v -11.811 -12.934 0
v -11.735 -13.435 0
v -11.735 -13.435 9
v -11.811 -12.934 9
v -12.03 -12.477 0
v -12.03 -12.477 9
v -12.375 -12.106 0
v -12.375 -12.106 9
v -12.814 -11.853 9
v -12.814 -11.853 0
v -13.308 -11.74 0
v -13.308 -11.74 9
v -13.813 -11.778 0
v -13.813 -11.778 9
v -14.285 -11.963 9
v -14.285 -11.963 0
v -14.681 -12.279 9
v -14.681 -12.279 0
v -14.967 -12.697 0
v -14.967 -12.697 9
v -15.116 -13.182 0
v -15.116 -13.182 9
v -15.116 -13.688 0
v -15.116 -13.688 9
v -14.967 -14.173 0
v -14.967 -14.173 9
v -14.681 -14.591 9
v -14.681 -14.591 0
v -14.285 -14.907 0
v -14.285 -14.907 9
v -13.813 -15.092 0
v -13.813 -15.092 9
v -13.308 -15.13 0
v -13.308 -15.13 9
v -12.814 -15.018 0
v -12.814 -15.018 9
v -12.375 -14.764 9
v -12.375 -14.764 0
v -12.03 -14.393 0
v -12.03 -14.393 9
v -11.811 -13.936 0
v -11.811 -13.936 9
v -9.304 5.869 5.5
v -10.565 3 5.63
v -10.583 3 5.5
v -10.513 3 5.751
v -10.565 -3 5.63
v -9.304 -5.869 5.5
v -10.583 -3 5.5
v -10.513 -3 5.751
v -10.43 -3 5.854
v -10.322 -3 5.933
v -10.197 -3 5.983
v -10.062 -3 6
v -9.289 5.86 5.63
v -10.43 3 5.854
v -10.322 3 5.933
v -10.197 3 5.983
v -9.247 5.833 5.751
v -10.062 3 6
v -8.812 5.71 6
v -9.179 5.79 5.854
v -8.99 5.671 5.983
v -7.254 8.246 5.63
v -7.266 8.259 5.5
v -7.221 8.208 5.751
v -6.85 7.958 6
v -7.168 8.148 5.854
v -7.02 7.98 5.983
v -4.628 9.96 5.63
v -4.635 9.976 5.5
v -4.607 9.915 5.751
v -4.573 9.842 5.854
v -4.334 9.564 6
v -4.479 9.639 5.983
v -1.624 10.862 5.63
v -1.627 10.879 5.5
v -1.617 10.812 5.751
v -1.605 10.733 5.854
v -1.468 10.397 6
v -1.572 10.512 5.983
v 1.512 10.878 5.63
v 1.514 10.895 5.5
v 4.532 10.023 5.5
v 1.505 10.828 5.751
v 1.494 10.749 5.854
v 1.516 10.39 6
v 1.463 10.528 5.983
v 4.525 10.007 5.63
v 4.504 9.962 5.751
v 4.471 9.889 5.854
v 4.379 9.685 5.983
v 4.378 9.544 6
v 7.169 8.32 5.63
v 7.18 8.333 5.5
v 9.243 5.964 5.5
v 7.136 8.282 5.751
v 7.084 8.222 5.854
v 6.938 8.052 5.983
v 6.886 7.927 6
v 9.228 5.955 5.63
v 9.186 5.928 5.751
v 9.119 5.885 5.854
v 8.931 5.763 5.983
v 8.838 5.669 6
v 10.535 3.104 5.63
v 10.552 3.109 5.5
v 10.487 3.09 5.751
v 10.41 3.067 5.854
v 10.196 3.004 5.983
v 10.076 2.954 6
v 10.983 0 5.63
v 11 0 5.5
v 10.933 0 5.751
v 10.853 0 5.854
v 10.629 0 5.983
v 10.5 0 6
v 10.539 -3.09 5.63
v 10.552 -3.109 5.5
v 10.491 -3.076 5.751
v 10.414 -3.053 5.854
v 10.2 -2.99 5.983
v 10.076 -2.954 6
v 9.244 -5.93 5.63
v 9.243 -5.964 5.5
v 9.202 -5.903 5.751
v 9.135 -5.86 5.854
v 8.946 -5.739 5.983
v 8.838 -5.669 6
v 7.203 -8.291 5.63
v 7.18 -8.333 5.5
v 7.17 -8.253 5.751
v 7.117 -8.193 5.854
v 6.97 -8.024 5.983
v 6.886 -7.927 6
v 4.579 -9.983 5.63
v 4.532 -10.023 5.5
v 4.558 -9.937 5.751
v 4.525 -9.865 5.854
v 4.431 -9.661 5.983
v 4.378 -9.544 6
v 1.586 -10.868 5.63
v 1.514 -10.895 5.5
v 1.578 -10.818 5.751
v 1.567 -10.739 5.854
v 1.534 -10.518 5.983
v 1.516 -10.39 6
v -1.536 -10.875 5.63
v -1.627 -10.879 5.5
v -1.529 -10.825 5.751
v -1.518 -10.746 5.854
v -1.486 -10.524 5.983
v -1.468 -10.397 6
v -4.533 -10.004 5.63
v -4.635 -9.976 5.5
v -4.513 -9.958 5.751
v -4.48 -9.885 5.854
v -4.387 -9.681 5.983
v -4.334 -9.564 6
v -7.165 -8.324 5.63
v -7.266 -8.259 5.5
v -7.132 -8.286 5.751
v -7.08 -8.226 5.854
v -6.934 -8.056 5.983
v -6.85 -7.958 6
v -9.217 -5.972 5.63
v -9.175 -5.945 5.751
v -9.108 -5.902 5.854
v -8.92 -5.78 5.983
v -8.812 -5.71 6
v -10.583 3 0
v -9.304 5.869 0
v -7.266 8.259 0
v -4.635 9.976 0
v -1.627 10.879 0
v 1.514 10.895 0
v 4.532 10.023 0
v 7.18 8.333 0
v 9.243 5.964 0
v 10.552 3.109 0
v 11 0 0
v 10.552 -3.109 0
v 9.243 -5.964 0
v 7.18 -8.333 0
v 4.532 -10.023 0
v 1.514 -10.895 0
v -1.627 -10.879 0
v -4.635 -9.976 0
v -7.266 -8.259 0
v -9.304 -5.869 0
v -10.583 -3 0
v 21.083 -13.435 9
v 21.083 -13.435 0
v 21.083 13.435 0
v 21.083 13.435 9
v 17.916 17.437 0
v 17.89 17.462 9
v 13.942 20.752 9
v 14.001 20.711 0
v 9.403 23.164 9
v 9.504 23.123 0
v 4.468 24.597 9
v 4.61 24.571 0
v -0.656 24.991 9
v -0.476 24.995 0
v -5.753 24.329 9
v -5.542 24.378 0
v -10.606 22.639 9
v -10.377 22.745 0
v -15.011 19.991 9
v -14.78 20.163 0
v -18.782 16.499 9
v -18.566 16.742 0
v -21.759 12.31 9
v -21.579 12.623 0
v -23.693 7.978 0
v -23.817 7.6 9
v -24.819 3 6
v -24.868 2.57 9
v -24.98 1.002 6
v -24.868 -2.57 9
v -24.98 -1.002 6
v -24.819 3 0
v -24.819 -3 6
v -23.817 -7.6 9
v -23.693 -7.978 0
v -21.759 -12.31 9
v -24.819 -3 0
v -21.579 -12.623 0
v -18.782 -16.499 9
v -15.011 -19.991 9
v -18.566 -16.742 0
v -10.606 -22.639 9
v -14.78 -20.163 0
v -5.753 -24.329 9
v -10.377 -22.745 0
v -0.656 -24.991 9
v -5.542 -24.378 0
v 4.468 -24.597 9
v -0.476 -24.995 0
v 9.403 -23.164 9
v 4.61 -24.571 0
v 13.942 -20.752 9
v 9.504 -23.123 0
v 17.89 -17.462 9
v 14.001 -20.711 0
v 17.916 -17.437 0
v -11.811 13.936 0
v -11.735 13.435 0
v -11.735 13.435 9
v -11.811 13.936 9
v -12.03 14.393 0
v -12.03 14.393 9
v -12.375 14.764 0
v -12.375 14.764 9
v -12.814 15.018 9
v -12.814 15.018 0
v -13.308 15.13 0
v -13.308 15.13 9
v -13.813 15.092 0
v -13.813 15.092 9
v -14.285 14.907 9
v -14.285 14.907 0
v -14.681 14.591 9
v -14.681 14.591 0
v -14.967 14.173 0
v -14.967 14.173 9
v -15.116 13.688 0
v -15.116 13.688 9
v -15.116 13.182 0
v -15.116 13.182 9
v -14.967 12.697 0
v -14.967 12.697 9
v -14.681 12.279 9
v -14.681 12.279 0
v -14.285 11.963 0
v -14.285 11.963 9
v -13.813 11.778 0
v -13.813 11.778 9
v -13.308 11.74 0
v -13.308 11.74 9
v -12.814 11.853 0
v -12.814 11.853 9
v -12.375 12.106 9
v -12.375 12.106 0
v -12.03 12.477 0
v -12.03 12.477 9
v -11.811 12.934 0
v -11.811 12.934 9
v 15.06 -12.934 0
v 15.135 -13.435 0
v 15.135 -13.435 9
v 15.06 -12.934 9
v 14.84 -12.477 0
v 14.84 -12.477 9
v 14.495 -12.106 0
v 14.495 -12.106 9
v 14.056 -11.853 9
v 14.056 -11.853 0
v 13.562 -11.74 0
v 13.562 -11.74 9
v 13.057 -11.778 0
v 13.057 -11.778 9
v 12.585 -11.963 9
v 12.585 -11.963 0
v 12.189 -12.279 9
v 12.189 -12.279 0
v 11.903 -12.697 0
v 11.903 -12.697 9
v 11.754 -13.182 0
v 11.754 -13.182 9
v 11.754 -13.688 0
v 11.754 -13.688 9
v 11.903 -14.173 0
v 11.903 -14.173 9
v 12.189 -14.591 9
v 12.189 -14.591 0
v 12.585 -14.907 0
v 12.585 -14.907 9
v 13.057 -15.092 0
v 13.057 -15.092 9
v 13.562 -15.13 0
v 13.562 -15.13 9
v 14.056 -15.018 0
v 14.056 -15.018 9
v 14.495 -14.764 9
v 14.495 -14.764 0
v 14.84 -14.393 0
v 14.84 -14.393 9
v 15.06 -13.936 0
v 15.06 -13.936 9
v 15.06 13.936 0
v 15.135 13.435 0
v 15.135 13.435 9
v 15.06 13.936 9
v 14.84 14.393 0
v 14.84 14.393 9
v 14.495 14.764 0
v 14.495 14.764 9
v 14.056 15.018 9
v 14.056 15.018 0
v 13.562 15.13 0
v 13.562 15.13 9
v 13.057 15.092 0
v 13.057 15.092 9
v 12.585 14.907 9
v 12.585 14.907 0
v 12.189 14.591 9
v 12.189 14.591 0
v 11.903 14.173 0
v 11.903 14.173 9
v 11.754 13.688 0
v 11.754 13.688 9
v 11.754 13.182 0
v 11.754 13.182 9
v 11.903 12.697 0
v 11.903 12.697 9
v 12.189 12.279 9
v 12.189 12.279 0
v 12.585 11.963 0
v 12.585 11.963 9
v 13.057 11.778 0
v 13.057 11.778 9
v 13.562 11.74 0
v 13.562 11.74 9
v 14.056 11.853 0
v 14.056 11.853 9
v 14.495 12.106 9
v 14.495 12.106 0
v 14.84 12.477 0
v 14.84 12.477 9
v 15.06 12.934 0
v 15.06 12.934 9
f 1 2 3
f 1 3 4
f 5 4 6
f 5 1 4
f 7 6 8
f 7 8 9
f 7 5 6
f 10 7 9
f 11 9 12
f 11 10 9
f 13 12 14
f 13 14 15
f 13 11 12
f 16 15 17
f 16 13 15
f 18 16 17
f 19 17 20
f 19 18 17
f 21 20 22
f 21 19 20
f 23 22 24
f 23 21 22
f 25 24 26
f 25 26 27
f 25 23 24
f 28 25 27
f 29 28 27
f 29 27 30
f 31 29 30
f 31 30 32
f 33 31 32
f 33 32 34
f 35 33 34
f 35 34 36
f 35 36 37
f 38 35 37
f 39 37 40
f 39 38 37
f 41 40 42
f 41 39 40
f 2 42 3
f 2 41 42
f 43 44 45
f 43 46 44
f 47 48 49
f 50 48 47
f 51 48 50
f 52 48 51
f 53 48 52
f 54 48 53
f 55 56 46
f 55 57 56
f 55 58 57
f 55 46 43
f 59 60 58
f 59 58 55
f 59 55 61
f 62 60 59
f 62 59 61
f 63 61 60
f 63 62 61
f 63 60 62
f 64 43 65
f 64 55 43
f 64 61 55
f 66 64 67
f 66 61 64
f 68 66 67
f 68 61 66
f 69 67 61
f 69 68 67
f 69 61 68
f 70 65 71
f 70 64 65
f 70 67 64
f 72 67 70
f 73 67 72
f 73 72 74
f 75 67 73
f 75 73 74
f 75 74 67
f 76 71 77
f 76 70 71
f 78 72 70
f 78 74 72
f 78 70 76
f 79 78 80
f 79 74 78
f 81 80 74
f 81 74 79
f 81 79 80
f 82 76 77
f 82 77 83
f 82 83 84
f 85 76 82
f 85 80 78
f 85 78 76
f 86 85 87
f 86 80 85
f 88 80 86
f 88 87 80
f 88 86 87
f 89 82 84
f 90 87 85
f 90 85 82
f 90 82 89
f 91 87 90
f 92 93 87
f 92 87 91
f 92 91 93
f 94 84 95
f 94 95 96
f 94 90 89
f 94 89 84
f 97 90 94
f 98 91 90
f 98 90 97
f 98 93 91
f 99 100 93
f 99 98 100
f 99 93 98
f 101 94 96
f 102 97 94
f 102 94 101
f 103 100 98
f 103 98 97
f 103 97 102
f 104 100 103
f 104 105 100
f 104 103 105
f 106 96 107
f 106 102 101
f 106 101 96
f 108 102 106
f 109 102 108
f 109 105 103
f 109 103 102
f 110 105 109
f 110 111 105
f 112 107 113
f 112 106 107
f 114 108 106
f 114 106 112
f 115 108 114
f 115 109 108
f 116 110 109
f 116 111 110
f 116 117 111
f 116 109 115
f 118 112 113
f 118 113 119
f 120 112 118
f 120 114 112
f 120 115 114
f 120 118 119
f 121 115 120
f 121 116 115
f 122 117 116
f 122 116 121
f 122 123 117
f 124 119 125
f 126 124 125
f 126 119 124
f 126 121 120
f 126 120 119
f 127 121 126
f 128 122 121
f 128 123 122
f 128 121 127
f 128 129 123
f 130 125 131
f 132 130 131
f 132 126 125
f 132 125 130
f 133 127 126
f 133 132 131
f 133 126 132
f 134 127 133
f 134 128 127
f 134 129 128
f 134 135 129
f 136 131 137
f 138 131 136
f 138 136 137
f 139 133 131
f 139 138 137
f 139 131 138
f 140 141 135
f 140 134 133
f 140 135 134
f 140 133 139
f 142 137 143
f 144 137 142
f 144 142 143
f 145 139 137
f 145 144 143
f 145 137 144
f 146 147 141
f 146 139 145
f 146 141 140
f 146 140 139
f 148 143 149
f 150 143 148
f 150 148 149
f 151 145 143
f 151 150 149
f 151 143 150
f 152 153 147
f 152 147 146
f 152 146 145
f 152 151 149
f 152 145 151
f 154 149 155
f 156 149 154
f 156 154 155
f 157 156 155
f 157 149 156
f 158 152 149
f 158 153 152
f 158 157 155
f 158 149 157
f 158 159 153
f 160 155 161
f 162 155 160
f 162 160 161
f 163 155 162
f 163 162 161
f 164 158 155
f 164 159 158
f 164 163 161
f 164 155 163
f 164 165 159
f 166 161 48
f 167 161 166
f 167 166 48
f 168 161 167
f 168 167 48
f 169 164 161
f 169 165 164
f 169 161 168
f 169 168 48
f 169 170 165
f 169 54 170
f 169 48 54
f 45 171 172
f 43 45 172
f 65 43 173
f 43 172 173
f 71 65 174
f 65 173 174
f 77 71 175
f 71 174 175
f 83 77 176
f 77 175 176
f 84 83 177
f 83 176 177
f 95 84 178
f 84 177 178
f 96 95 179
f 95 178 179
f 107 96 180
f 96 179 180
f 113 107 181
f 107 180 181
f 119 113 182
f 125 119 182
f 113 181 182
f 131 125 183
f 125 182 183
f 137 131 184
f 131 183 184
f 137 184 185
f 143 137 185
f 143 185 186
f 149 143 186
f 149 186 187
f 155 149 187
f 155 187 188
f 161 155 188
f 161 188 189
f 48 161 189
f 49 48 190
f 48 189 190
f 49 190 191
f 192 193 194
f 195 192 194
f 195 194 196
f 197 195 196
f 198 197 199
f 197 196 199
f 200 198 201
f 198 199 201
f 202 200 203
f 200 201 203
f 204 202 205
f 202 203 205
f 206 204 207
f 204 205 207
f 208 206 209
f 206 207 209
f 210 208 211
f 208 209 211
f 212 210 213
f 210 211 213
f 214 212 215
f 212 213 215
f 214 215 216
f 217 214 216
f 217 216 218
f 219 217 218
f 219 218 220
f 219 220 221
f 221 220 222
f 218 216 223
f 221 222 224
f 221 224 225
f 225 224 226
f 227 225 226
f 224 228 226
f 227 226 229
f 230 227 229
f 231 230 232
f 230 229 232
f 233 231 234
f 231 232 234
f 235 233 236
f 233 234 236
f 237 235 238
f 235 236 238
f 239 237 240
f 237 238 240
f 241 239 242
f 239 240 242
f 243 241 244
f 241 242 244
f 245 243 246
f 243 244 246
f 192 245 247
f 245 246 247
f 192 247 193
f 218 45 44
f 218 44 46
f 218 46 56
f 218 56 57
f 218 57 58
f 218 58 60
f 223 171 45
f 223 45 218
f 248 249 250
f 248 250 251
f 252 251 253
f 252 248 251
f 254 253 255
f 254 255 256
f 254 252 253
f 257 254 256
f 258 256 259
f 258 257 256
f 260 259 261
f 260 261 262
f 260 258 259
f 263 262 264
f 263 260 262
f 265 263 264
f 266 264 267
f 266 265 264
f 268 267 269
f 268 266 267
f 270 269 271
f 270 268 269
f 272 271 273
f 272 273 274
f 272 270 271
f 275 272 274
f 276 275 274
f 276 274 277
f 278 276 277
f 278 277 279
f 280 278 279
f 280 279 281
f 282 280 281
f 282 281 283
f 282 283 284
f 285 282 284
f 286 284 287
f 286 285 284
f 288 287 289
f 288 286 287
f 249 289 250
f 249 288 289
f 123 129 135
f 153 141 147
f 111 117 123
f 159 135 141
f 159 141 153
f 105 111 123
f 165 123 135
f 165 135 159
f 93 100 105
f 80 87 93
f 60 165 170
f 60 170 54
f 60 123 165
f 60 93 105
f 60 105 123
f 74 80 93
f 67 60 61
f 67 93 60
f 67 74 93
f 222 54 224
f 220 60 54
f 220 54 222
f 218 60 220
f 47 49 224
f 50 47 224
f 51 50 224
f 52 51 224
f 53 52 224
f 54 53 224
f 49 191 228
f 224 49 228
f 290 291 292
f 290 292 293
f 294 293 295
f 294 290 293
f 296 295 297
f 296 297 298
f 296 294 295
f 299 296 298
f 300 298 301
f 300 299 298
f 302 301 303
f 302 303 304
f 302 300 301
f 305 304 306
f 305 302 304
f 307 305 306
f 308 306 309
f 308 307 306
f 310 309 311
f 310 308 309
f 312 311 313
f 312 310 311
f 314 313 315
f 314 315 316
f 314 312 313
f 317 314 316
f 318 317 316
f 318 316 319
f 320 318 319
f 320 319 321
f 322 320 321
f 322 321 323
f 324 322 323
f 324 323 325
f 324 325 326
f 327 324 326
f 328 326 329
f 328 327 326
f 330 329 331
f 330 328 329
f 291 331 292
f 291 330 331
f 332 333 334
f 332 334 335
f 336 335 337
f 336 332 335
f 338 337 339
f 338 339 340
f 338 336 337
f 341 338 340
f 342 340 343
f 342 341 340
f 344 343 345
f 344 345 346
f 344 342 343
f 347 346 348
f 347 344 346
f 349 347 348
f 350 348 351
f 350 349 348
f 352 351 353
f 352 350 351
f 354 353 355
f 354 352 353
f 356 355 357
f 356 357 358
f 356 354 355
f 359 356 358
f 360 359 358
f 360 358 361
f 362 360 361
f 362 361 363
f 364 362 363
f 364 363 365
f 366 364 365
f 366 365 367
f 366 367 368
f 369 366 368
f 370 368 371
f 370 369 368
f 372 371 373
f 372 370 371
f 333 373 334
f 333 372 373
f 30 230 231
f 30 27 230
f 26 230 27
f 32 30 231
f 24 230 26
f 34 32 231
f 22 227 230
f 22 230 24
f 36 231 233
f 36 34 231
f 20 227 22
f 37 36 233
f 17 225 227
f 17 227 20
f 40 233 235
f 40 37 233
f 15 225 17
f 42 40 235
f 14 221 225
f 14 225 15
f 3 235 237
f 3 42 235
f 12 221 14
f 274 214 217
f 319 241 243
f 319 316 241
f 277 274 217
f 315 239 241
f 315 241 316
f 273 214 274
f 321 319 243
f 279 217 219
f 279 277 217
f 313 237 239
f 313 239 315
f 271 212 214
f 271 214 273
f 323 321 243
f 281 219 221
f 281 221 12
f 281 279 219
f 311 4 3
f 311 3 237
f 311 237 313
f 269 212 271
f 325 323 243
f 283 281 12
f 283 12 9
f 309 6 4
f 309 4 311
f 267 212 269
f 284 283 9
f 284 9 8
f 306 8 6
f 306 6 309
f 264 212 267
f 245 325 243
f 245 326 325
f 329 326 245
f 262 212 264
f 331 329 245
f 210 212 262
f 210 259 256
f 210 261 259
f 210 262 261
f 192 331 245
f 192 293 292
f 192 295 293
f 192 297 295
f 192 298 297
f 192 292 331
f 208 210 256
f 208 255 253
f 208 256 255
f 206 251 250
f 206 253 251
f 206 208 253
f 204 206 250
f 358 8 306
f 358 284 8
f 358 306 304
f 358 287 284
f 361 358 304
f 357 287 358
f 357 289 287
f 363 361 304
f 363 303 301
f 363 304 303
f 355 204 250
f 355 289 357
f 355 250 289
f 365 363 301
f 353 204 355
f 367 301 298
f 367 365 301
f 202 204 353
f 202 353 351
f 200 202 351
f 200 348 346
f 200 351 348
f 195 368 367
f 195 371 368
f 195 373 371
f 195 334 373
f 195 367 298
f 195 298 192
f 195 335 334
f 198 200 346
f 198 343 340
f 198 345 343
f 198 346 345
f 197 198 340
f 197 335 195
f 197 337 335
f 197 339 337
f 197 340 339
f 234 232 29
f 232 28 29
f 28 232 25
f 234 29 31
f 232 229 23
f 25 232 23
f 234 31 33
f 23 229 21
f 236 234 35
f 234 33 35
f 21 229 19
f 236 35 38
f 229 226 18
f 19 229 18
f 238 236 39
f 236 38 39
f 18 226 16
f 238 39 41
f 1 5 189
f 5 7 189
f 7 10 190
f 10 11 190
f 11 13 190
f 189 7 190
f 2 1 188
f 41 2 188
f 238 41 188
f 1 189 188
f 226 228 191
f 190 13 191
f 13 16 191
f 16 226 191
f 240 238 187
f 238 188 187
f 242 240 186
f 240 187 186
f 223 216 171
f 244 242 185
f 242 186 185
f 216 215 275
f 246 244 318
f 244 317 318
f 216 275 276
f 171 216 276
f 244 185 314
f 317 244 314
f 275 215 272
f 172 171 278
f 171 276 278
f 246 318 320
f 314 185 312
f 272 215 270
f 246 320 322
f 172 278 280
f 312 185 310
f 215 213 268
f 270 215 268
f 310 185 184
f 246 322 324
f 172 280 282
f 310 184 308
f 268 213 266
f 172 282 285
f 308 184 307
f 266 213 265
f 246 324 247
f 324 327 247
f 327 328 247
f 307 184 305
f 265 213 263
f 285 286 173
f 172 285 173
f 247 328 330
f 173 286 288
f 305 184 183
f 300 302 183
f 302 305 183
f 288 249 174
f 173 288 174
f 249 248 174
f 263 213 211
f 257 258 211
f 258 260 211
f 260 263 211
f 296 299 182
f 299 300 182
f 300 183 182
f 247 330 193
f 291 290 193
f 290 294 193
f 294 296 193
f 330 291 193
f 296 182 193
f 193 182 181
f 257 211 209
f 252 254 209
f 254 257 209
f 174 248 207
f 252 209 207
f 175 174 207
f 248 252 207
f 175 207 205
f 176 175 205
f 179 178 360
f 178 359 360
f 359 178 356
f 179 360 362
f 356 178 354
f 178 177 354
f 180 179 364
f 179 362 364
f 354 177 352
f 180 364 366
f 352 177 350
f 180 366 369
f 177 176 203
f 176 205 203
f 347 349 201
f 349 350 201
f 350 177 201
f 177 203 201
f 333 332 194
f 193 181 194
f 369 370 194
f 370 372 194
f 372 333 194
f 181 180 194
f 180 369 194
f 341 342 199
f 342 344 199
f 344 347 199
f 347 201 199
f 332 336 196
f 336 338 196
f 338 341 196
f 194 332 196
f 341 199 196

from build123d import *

# Parameters (mm, degrees)
ESQUISSE1_R             = 25
ESQUISSE1_R_2           = 1.7
BOSS_EXTRU_1_DEPTH      = 9
ESQUISSE6_R             = 11
ENL_V_MAT_EXTRU_2_DEPTH = 6
CONG_2_R                = 0.5
ESQUISSE15_W            = 7.963879273
ESQUISSE15_H            = 27.450042448
ENL_V_MAT_EXTRU_4_DEPTH = 37.482872694
ESQUISSE16_W            = 21.21339198
ESQUISSE16_H            = 6
ENL_V_MAT_EXTRU_5_DEPTH = 6


with BuildPart() as part:
    # Esquisse1 → Boss.-Extru.1 (new body)
    with BuildSketch(Plane.XY):
        Circle(ESQUISSE1_R)
        with Locations((-13.435028843, 13.435028843)):
            Circle(ESQUISSE1_R_2, mode=Mode.SUBTRACT)
        with Locations((13.435028843, 13.435028843)):
            Circle(ESQUISSE1_R_2, mode=Mode.SUBTRACT)
        with Locations((13.435028843, -13.435028843)):
            Circle(ESQUISSE1_R_2, mode=Mode.SUBTRACT)
        with Locations((-13.435028843, -13.435028843)):
            Circle(ESQUISSE1_R_2, mode=Mode.SUBTRACT)
    extrude(amount=BOSS_EXTRU_1_DEPTH)

    # Esquisse6 → Enlèv. mat.-Extru.2 (cut)
    with BuildSketch(Plane(origin=(0, 0, 0), x_dir=(-1, 0, 0), z_dir=(0, 0, -1))):
        Circle(ESQUISSE6_R)
    extrude(amount=-ENL_V_MAT_EXTRU_2_DEPTH, mode=Mode.SUBTRACT)

    # Congé2
    cong_2_edges = [part.edges().sort_by_distance(p)[0] for p in [
        (11, 0, 6),
    ]]
    fillet(cong_2_edges, radius=CONG_2_R)

    # Esquisse15 → Enlèv. mat.-Extru.4 (cut, through all)
    with BuildSketch(Plane(origin=(0, 0, 0), x_dir=(-1, 0, 0), z_dir=(0, 0, -1))):
        with Locations((-25.065108278, -0.289992381)):
            Rectangle(ESQUISSE15_W, ESQUISSE15_H)
    extrude(amount=-ENL_V_MAT_EXTRU_4_DEPTH, mode=Mode.SUBTRACT)

    # Esquisse16 → Enlèv. mat.-Extru.5 (cut)
    with BuildSketch(Plane(origin=(0, 0, 0), x_dir=(-1, 0, 0), z_dir=(0, 0, -1))):
        with Locations((17.506358801, 0)):
            Rectangle(ESQUISSE16_W, ESQUISSE16_H)
    extrude(amount=-ENL_V_MAT_EXTRU_5_DEPTH, mode=Mode.SUBTRACT)


solid = part.part
